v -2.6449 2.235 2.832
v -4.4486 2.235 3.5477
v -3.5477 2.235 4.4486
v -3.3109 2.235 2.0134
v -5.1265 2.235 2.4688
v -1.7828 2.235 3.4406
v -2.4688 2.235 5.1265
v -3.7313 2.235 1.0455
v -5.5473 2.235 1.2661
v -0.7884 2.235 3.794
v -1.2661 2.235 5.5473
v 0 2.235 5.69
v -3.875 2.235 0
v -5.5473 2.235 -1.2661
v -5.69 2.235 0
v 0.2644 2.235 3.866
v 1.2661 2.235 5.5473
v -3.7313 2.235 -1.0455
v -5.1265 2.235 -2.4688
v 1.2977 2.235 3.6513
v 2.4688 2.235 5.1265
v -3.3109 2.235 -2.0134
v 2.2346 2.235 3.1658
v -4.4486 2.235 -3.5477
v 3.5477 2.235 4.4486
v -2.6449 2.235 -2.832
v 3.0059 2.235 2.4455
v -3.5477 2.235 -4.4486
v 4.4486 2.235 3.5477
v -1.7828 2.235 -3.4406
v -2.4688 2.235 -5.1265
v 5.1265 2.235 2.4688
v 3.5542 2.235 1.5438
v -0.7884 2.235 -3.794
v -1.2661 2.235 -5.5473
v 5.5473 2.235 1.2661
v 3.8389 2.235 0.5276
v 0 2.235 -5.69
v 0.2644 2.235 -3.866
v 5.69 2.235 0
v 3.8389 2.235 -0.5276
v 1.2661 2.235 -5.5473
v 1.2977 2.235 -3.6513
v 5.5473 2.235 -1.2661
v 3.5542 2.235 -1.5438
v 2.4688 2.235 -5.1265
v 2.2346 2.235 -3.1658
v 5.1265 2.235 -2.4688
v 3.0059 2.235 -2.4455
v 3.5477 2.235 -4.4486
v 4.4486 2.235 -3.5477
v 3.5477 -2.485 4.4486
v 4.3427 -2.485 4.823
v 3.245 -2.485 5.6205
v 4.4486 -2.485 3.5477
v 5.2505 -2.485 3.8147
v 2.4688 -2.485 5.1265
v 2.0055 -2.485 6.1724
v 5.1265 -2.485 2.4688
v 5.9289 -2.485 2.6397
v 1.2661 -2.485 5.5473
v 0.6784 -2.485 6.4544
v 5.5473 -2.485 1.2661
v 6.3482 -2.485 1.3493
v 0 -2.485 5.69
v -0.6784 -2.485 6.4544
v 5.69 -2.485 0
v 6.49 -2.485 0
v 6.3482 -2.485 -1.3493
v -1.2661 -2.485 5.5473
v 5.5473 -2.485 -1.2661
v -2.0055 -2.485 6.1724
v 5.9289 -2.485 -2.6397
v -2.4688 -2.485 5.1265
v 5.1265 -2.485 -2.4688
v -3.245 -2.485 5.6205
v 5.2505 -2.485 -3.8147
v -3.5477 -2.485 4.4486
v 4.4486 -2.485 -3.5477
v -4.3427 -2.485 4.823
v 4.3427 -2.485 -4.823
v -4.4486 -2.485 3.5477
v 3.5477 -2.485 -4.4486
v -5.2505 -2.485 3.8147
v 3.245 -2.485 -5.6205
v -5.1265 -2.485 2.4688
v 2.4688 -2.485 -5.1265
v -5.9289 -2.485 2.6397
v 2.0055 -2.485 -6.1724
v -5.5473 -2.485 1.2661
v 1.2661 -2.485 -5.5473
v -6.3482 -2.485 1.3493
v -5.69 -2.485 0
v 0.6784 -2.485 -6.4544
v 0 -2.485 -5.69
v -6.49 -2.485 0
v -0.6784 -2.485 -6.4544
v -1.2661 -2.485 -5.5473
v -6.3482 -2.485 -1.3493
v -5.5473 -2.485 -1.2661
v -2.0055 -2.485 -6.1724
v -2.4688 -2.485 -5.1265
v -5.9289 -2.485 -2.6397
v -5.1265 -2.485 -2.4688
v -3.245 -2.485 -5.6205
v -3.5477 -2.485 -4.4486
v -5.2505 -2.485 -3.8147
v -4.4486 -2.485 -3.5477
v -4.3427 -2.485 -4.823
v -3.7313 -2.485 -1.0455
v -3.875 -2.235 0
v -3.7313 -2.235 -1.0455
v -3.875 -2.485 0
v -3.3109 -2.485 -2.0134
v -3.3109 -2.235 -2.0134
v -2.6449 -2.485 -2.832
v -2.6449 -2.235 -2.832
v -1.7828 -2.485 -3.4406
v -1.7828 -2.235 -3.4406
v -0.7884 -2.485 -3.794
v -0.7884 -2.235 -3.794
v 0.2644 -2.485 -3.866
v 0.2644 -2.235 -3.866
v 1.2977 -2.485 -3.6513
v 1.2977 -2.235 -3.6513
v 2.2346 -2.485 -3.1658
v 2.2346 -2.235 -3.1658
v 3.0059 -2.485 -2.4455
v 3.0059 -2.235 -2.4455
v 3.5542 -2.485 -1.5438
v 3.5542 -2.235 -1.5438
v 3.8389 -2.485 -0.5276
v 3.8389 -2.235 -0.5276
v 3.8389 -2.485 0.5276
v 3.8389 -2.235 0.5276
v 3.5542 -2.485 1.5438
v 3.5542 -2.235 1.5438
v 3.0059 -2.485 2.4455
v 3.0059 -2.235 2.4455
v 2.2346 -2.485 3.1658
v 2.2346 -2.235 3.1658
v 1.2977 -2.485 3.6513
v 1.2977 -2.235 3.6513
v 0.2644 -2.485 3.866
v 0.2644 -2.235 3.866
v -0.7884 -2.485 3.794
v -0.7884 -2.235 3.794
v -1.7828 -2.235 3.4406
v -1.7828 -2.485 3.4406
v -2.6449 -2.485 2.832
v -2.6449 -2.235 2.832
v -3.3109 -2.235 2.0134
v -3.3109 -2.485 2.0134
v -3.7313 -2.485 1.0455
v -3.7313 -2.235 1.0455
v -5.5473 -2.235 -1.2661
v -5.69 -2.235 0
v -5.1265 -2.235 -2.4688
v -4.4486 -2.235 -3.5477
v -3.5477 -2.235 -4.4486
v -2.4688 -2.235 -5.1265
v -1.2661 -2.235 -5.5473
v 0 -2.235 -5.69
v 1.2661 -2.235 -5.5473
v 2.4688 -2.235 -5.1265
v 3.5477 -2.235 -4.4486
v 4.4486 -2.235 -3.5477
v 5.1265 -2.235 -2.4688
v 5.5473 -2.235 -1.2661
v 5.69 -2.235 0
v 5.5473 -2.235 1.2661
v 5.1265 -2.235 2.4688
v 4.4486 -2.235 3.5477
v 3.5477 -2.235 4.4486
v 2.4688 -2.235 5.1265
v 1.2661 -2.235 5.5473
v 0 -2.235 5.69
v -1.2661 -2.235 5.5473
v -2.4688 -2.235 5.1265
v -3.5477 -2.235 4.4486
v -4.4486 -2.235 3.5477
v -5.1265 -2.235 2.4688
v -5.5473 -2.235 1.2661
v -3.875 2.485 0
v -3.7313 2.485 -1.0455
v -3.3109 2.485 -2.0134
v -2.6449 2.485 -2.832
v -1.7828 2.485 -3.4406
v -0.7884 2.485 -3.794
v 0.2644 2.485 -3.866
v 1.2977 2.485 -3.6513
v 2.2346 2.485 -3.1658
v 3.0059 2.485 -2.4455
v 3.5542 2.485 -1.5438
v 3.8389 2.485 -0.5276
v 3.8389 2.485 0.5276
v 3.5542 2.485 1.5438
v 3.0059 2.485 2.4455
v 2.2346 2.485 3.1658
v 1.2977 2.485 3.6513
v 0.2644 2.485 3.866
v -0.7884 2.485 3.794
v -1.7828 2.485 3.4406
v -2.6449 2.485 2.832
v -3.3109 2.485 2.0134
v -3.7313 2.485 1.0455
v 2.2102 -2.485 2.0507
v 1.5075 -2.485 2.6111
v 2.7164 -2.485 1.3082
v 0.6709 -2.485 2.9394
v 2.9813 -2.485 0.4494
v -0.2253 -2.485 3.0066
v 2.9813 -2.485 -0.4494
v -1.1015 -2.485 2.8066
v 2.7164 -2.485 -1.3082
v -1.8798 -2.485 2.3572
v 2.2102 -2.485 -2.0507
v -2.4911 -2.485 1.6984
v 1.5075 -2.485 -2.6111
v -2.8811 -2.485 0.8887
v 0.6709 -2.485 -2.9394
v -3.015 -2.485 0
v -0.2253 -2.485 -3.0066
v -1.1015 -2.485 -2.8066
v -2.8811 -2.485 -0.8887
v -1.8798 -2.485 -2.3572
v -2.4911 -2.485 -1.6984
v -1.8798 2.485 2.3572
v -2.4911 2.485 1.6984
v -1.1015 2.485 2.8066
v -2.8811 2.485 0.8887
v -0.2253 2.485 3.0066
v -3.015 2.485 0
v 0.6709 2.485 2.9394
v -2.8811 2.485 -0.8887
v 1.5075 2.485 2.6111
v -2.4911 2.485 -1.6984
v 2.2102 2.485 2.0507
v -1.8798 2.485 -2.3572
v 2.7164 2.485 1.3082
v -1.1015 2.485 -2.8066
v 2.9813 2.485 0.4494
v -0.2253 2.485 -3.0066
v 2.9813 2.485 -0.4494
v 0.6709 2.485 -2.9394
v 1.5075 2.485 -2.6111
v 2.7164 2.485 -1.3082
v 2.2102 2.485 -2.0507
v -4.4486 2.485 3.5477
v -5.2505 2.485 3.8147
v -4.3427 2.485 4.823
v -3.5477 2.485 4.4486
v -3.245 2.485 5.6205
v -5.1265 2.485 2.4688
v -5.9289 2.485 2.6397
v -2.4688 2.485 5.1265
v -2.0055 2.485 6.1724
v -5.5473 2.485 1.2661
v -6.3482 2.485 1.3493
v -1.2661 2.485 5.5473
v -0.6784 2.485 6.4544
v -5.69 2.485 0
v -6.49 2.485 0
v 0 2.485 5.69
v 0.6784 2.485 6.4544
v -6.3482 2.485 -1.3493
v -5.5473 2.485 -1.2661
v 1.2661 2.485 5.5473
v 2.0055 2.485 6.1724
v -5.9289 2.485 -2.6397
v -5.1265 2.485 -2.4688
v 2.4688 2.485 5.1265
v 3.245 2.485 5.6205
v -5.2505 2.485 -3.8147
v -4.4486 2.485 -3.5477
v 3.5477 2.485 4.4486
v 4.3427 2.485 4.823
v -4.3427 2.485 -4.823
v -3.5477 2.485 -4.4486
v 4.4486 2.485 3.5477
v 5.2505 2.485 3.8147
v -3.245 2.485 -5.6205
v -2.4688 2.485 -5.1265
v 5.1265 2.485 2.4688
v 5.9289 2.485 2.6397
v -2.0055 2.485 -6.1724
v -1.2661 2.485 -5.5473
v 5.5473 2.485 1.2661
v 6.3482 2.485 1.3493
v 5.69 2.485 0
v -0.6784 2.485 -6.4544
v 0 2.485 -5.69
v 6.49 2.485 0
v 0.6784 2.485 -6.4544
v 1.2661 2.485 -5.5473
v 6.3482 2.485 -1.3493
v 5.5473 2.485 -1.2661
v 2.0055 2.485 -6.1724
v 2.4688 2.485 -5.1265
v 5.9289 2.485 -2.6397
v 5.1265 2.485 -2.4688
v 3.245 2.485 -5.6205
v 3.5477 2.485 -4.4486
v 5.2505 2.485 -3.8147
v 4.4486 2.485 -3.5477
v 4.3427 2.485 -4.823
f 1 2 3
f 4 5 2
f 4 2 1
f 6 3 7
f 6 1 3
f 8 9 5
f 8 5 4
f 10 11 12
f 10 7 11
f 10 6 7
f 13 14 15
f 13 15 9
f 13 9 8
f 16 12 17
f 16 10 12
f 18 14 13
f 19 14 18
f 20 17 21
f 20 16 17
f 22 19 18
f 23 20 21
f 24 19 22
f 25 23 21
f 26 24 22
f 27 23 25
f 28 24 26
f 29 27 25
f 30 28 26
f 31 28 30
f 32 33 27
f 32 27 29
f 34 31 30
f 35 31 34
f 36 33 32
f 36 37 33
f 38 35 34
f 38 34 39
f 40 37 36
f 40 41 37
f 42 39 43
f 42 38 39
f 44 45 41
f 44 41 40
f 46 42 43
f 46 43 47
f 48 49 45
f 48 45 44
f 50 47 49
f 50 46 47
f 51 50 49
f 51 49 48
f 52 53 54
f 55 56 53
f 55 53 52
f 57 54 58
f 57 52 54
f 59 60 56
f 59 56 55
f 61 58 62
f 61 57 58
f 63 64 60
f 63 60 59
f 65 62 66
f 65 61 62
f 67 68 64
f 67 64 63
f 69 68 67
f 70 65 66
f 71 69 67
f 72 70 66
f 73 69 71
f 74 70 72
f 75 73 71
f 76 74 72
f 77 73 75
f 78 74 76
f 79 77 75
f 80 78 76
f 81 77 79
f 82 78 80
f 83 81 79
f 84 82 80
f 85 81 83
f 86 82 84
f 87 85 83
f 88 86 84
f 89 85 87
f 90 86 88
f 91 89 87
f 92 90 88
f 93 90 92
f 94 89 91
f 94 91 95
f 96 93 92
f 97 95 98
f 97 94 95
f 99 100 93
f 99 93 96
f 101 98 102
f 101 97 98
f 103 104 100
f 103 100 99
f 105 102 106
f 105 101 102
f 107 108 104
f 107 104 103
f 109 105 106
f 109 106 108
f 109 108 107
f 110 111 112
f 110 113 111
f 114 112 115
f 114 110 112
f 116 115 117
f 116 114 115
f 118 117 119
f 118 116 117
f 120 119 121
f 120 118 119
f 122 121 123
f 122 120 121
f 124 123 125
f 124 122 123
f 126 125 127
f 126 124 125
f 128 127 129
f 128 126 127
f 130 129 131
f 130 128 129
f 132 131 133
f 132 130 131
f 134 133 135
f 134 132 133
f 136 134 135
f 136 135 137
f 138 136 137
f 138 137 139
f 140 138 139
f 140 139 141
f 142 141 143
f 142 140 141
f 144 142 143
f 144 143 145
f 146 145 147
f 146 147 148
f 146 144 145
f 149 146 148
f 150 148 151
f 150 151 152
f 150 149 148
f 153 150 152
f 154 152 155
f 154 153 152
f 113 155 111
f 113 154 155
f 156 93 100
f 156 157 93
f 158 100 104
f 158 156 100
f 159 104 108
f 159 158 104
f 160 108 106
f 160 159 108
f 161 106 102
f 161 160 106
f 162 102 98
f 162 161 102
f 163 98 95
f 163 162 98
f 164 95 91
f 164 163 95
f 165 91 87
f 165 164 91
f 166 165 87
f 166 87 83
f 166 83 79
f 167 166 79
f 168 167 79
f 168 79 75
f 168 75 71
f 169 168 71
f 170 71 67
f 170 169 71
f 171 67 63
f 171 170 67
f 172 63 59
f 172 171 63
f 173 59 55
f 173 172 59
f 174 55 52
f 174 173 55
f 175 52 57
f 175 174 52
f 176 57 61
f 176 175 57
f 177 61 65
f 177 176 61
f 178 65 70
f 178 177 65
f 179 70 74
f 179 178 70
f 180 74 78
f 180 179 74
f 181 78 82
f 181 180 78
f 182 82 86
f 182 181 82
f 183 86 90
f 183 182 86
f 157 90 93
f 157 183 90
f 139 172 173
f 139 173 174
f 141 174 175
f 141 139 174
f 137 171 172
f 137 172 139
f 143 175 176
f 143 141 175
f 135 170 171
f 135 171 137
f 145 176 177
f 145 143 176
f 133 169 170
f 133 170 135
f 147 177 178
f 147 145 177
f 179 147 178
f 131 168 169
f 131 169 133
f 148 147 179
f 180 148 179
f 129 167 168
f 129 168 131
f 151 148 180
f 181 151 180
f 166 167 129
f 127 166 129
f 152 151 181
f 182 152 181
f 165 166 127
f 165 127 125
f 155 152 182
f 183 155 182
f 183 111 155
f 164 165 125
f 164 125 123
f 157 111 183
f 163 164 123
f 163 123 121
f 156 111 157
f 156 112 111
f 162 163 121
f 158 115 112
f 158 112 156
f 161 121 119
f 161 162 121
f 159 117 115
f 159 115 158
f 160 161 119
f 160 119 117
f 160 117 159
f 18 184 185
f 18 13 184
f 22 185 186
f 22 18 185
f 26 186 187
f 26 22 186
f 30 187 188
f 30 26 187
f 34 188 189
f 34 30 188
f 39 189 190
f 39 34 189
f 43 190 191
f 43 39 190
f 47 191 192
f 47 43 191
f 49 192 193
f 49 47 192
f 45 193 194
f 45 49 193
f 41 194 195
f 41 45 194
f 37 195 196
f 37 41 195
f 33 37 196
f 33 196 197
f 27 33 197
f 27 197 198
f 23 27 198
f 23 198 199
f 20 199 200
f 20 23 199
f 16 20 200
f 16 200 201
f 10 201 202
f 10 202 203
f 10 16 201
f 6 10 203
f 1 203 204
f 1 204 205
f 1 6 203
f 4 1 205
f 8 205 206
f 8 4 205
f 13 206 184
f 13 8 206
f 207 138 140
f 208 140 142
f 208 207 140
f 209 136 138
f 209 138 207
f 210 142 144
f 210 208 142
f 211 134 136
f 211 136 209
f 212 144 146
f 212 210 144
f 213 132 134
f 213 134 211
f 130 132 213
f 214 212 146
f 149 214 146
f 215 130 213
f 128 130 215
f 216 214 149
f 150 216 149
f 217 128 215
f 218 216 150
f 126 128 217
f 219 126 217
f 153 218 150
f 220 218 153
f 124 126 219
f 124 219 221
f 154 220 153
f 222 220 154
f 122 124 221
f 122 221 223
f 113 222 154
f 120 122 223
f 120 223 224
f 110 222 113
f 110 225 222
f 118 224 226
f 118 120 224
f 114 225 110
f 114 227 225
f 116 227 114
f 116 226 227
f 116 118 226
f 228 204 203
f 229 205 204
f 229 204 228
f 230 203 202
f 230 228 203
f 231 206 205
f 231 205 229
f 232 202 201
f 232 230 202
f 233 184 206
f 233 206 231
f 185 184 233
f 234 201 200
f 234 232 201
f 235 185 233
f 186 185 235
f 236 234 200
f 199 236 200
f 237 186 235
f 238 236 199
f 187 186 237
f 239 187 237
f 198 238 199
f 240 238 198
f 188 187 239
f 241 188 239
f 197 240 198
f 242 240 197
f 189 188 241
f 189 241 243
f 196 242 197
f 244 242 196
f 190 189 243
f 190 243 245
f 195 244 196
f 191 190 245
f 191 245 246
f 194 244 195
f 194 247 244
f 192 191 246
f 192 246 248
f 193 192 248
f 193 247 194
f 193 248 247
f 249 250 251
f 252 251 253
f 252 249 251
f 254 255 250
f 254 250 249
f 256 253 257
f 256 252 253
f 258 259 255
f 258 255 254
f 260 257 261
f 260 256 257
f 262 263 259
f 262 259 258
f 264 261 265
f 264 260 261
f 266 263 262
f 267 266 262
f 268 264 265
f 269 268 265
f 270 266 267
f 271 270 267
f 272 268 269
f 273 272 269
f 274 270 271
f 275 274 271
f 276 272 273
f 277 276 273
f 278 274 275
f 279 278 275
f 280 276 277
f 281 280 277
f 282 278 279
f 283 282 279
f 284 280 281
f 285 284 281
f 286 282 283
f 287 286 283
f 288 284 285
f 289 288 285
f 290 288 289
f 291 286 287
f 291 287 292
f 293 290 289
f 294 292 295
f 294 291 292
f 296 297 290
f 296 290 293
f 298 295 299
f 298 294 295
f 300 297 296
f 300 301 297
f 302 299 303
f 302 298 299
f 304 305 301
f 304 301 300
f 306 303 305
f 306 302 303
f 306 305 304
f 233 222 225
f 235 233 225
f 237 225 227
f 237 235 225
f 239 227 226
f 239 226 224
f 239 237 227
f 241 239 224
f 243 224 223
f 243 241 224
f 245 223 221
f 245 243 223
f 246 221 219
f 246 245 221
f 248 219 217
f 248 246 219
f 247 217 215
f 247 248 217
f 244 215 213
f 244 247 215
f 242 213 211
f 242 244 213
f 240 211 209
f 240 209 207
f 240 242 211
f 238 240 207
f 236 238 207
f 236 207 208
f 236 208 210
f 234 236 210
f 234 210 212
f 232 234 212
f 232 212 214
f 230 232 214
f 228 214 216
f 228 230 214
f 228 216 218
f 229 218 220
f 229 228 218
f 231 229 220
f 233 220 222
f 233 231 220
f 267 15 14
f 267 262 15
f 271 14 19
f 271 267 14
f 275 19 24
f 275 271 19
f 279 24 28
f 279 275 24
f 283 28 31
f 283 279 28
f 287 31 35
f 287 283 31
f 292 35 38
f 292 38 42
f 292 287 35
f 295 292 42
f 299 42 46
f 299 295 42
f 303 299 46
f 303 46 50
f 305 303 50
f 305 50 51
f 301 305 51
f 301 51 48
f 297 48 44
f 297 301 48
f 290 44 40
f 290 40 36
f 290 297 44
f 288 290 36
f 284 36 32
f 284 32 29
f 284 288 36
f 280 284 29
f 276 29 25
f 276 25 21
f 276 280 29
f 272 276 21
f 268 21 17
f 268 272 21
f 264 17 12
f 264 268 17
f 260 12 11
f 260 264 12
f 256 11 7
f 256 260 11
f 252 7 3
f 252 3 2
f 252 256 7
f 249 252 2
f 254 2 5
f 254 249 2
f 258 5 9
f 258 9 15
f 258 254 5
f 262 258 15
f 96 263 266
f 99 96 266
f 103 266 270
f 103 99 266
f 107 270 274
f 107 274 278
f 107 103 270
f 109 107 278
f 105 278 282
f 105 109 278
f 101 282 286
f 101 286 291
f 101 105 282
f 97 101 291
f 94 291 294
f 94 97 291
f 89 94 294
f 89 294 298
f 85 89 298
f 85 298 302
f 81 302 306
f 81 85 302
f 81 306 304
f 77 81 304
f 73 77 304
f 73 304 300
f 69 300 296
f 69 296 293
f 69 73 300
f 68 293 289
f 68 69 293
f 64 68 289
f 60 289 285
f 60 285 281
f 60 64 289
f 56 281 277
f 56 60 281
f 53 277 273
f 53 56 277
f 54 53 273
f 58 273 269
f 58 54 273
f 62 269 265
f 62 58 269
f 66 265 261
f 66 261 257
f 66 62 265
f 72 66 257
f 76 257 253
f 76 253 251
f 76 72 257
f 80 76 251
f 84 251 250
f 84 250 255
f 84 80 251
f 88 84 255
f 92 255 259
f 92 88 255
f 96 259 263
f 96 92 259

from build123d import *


with BuildPart() as f1:
    # F0 (on Top) → F1 (revolve)
    with BuildSketch(Plane.XY):
        Polygon((-6.49, 2.485), (-6.49, 0), (-6.49, -2.485), (-5.69, -2.485), (-5.69, -2.235), (-5.69, 0), (-5.69, 2.235), (-5.69, 2.485), align=None)
        Polygon((-3.875, 2.235), (-5.69, 2.235), (-5.69, 0), (-5.69, -2.235), (-3.875, -2.235), (-3.875, 0), align=None)
        Polygon((-3.875, 2.485), (-3.875, 2.235), (-3.875, 0), (-3.875, -2.235), (-3.875, -2.485), (-3.015, -2.485), (-3.015, 0), (-3.015, 2.485), align=None)
    revolve(axis=Axis((0, 2.798411, 0), (0, -1, 0)))


solid = f1.part
